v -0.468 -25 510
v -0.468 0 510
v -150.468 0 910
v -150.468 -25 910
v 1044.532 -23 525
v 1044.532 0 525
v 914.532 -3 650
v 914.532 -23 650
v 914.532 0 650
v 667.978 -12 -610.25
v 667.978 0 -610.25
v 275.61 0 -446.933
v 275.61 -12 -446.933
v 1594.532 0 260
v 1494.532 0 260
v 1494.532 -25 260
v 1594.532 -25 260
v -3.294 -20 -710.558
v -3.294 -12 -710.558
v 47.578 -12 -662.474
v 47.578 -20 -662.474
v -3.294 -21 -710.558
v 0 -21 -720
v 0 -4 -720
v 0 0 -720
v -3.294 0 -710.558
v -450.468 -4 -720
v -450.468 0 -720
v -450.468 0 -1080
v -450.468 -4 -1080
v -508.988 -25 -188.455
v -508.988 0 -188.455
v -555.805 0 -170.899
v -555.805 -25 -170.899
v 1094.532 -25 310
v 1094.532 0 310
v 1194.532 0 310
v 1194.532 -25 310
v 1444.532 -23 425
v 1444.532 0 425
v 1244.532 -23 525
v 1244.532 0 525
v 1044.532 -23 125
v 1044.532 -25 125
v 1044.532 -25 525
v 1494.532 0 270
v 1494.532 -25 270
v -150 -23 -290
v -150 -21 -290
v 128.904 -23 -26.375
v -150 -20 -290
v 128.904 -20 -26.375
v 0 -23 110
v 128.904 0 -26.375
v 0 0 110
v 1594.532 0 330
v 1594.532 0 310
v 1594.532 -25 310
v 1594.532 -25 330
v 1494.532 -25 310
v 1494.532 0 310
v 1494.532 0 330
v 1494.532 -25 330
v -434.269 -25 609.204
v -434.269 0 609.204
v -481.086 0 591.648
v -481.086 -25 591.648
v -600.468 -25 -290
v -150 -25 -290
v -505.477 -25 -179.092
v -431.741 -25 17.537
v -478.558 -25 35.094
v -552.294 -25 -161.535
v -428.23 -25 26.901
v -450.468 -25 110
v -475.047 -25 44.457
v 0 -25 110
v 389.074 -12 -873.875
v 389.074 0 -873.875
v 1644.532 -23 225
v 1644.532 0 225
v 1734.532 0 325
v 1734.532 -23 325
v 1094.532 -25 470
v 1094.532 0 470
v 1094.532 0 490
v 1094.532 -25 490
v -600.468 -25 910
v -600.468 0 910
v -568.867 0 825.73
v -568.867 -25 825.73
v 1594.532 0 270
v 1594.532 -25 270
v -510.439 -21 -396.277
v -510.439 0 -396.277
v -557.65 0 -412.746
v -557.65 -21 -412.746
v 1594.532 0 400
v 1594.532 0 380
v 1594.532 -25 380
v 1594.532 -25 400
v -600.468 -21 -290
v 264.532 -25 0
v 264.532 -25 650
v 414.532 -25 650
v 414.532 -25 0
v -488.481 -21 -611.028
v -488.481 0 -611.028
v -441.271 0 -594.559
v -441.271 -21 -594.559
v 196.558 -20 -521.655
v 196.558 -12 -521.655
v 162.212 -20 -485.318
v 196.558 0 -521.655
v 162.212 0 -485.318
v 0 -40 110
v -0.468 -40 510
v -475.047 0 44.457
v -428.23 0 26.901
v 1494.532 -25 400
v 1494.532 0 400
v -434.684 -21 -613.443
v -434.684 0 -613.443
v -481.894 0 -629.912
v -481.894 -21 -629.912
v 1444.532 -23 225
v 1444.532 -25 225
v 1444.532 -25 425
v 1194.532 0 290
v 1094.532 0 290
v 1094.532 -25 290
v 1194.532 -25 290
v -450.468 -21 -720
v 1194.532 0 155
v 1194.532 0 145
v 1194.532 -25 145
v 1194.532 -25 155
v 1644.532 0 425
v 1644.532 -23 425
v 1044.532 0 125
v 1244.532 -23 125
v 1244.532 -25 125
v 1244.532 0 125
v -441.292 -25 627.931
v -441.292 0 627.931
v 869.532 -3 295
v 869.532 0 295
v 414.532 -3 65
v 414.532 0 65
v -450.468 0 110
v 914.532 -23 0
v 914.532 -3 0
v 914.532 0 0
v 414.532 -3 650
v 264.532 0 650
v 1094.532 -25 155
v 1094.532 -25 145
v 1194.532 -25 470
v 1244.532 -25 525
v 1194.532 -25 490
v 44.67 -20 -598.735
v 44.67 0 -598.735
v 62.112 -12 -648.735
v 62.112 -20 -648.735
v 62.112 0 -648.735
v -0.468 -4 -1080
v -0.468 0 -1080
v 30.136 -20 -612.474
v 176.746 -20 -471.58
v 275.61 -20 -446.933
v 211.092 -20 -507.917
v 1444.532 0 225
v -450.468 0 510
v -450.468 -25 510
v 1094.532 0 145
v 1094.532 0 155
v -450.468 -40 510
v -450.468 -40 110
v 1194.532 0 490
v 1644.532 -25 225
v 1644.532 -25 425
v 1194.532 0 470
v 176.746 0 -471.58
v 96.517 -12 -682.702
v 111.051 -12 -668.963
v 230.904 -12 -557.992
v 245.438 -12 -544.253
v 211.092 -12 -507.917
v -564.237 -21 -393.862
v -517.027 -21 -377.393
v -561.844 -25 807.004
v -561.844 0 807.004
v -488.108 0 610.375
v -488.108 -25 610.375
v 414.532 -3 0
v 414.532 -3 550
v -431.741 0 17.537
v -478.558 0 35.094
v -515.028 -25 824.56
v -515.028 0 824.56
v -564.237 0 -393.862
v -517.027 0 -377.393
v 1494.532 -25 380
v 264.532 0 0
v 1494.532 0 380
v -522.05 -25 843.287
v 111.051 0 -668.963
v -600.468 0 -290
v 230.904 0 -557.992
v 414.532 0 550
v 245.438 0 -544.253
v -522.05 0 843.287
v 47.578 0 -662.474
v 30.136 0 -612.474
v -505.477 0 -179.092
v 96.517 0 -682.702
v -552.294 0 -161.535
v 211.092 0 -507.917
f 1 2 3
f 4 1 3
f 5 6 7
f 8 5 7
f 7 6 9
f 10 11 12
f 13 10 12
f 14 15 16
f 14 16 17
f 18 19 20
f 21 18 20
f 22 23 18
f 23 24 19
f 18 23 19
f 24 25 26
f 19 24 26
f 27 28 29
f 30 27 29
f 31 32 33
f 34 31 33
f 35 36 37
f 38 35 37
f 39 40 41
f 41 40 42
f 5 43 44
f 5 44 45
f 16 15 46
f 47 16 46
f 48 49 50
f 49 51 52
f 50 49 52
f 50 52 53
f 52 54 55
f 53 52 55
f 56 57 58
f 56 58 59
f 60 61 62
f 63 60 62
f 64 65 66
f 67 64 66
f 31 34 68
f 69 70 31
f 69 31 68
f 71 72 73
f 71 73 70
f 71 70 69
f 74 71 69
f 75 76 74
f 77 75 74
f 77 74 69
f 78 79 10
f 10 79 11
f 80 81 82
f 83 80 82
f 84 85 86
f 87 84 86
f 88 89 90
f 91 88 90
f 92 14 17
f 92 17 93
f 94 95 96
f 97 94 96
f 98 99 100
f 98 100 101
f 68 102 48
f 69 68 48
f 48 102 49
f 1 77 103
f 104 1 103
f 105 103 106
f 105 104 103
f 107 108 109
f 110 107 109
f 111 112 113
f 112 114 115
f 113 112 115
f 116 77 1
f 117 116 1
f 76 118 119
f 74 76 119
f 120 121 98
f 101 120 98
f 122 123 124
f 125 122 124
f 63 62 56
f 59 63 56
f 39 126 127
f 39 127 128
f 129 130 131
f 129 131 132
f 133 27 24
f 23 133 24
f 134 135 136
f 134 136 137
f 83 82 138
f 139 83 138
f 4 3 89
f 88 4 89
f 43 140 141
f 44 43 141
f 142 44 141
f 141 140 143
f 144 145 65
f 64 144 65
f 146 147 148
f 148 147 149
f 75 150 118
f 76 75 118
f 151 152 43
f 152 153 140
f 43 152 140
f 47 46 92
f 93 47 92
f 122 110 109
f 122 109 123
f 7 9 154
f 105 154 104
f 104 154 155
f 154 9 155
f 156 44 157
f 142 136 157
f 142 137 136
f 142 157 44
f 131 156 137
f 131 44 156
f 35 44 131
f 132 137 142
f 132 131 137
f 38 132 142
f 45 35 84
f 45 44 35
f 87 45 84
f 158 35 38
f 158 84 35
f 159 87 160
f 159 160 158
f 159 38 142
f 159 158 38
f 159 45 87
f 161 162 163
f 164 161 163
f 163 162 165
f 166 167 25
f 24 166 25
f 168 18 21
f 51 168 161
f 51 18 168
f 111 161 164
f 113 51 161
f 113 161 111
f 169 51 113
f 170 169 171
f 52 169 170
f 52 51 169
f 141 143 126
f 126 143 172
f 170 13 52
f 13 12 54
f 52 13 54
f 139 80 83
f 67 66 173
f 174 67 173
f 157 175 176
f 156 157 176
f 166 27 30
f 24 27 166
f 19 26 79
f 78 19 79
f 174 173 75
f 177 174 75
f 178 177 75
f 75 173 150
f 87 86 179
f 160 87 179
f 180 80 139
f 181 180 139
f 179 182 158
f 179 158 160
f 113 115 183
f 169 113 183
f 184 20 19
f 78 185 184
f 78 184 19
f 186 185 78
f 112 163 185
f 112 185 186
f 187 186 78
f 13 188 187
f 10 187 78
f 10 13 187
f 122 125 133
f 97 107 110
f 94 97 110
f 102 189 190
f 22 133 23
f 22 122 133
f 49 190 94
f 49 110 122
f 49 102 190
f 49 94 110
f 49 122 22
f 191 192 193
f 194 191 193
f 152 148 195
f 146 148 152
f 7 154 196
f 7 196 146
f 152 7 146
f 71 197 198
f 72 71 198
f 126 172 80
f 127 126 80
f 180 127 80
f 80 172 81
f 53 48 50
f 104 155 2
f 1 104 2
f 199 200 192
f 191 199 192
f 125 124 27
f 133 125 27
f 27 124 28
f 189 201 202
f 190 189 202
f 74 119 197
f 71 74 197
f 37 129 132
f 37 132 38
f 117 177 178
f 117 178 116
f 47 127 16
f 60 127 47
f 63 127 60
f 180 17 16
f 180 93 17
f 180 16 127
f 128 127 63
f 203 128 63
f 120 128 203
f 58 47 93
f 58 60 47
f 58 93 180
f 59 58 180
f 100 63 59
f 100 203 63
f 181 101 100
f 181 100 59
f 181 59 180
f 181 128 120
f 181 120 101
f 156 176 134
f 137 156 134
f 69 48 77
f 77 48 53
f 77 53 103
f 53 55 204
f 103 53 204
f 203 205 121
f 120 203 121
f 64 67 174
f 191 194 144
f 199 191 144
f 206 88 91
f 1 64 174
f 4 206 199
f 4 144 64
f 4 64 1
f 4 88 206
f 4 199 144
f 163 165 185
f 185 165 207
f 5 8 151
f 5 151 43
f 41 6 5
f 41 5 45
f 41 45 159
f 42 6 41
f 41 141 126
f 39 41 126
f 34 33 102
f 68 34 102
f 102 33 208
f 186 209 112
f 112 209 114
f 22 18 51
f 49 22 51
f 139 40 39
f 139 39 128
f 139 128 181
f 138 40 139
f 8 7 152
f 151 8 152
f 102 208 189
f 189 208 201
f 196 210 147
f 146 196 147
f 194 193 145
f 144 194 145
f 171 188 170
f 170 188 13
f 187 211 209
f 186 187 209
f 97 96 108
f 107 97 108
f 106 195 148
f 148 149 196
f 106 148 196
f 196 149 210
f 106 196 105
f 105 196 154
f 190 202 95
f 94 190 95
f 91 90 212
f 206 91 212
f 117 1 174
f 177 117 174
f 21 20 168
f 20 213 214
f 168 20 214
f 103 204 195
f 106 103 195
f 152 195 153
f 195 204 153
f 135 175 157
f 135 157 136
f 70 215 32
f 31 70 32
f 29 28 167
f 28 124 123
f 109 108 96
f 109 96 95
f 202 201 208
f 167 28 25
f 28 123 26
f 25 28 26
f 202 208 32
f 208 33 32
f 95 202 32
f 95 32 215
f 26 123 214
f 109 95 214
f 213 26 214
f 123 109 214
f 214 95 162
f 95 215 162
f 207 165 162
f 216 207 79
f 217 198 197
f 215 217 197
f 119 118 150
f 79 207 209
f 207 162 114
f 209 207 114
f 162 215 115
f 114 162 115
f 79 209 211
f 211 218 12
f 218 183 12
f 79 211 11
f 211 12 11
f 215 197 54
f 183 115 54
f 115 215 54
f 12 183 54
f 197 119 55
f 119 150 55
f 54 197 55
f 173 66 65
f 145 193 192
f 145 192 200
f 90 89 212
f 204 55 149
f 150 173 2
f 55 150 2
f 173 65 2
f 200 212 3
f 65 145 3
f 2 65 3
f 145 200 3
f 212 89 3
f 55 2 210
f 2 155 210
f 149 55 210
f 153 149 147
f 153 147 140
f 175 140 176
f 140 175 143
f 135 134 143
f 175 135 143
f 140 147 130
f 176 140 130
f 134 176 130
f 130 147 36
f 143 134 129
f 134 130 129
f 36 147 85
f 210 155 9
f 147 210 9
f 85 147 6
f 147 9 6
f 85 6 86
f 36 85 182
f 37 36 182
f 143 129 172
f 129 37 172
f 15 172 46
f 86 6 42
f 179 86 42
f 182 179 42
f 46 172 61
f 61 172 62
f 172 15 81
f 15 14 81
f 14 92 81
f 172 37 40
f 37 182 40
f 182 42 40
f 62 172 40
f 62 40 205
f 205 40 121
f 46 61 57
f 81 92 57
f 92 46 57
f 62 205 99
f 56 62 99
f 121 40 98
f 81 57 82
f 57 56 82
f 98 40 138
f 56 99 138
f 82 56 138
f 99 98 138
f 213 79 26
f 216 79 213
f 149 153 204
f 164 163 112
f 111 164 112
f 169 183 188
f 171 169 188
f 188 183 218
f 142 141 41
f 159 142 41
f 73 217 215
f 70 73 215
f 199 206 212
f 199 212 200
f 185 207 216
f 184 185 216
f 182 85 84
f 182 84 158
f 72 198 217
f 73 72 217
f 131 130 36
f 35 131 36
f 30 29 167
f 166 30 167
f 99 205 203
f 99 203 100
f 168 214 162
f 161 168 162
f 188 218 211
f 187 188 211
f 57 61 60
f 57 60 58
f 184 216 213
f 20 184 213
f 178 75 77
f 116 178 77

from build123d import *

# Parameters (mm, degrees)
F1_DEPTH  = 25
F2_DEPTH  = 40
F3_DEPTH  = 25
F4_DEPTH  = 21
F5_DEPTH  = 4
F6_DEPTH  = 25
F7_DEPTH  = 3
F8_DEPTH  = 23
F0_W      = 200
F0_H      = 400
F0_W_2    = 100
F0_H_2    = 10
F0_H_3    = 20
F9_DEPTH  = 25
F10_DEPTH = 23
F0_H_4    = 200
F11_DEPTH = 25
F12_DEPTH = 23
F13_DEPTH = 23
F14_DEPTH = 20
F15_DEPTH = 12


with BuildPart() as f1:
    # F0 (on Front) → F1 (new body)
    with BuildSketch(Plane.XZ):
        Polygon((-150.467881, 910), (-600.467881, 910), (-568.866771, 825.730374), (-522.050312, 843.286546), (-515.027843, 824.559963), (-561.844302, 807.00379), (-488.108379, 610.374663), (-441.29192, 627.930835), (-434.269452, 609.204252), (-481.085911, 591.64808), (-450.467881, 510), (-0.467881, 510), align=None)
    extrude(amount=F1_DEPTH)

    # F0 (on Front) → F2 (join)
    with BuildSketch(Plane.XZ):
        Polygon((0, 110), (-0.467881, 510), (-450.467881, 510), (-450.467881, 110), align=None)
    extrude(amount=F2_DEPTH)

    # F0 (on Front) → F3 (join)
    with BuildSketch(Plane.XZ):
        Polygon((-150, -290), (0, 110), (-450.467881, 110), (-475.046522, 44.456958), (-428.230063, 26.900785), (-431.741297, 17.537494), (-478.557756, 35.093666), (-552.293679, -161.535461), (-505.47722, -179.091634), (-508.988454, -188.454925), (-555.804913, -170.898753), (-600.467881, -290), align=None)
    extrude(amount=F3_DEPTH)

    # F0 (on Front) → F4 (join)
    with BuildSketch(Plane.XZ):
        Polygon((-3.293722, -710.557998), (-150, -290), (-600.467881, -290), (-564.236943, -393.86202), (-517.026934, -377.393412), (-510.439491, -396.277416), (-557.6495, -412.746024), (-488.481348, -611.028062), (-441.271338, -594.559454), (-434.683895, -613.443458), (-481.893904, -629.912065), (-450.467881, -720), (0, -720), align=None)
    extrude(amount=F4_DEPTH)

    # F0 (on Front) → F5 (join)
    with BuildSketch(Plane.XZ):
        Polygon((-0.467881, -1080), (0, -720), (-450.467881, -720), (-450.467881, -1080), align=None)
    extrude(amount=F5_DEPTH)

    # F0 (on Front) → F6 (join)
    with BuildSketch(Plane.XZ):
        Polygon((264.532119, 650), (-0.467881, 510), (0, 110), (264.532119, 0), (414.532119, 0), (414.532119, 65), (414.532119, 550), (414.532119, 650), align=None)
    extrude(amount=F6_DEPTH)

    # F0 (on Front) → F7 (join)
    with BuildSketch(Plane.XZ):
        Polygon((914.532119, 650), (414.532119, 650), (414.532119, 550), (869.532119, 295), (414.532119, 65), (414.532119, 0), (914.532119, 0), align=None)
    extrude(amount=F7_DEPTH)

    # F0 (on Front) → F8 (join)
    with BuildSketch(Plane.XZ):
        Polygon((1044.532119, 525), (914.532119, 650), (914.532119, 0), (1044.532119, 125), align=None)
    extrude(amount=F8_DEPTH)

    # F0 (on Front) → F9 (join)
    with BuildSketch(Plane.XZ):
        with Locations((1144.532119, 325)):
            Rectangle(F0_W, F0_H)
        with Locations((1144.532119, 150)):
            Rectangle(F0_W_2, F0_H_2, mode=Mode.SUBTRACT)
        with Locations((1144.532119, 300)):
            Rectangle(F0_W_2, F0_H_3, mode=Mode.SUBTRACT)
        with Locations((1144.532119, 480)):
            Rectangle(F0_W_2, F0_H_3, mode=Mode.SUBTRACT)
    extrude(amount=F9_DEPTH)

    # F0 (on Front) → F10 (join)
    with BuildSketch(Plane.XZ):
        Polygon((1444.532119, 425), (1244.532119, 525), (1244.532119, 125), (1444.532119, 225), align=None)
    extrude(amount=F10_DEPTH)

    # F0 (on Front) → F11 (join)
    with BuildSketch(Plane.XZ):
        with Locations((1544.532119, 325)):
            Rectangle(F0_W, F0_H_4)
        with Locations((1544.532119, 265)):
            Rectangle(F0_W_2, F0_H_2, mode=Mode.SUBTRACT)
        with Locations((1544.532119, 320)):
            Rectangle(F0_W_2, F0_H_3, mode=Mode.SUBTRACT)
        with Locations((1544.532119, 390)):
            Rectangle(F0_W_2, F0_H_3, mode=Mode.SUBTRACT)
    extrude(amount=F11_DEPTH)

    # F0 (on Front) → F12 (join)
    with BuildSketch(Plane.XZ):
        Polygon((1734.532119, 325), (1644.532119, 425), (1644.532119, 225), align=None)
    extrude(amount=F12_DEPTH)

    # F0 (on Front) → F13 (join)
    with BuildSketch(Plane.XZ):
        Polygon((128.904064, -26.375063), (0, 110), (-150, -290), align=None)
    extrude(amount=F13_DEPTH)

    # F0 (on Front) → F14 (join)
    with BuildSketch(Plane.XZ):
        Polygon((128.904064, -26.375063), (-150, -290), (-3.293722, -710.557998), (47.57757, -662.473575), (30.135709, -612.473575), (44.670364, -598.735169), (62.112224, -648.735169), (196.55778, -521.654908), (162.211763, -485.318272), (176.746418, -471.579865), (211.092434, -507.916502), (275.610342, -446.933061), align=None)
    extrude(amount=F14_DEPTH)

    # F0 (on Front) → F15 (join)
    with BuildSketch(Plane.XZ):
        Polygon((47.57757, -662.473575), (-3.293722, -710.557998), (389.074081, -873.875197), (667.978145, -610.250259), (275.610342, -446.933061), (211.092434, -507.916502), (245.438451, -544.253138), (230.903796, -557.991545), (196.55778, -521.654908), (62.112224, -648.735169), (111.051329, -668.96343), (96.516674, -682.701836), align=None)
    extrude(amount=F15_DEPTH)


solid = f1.part
